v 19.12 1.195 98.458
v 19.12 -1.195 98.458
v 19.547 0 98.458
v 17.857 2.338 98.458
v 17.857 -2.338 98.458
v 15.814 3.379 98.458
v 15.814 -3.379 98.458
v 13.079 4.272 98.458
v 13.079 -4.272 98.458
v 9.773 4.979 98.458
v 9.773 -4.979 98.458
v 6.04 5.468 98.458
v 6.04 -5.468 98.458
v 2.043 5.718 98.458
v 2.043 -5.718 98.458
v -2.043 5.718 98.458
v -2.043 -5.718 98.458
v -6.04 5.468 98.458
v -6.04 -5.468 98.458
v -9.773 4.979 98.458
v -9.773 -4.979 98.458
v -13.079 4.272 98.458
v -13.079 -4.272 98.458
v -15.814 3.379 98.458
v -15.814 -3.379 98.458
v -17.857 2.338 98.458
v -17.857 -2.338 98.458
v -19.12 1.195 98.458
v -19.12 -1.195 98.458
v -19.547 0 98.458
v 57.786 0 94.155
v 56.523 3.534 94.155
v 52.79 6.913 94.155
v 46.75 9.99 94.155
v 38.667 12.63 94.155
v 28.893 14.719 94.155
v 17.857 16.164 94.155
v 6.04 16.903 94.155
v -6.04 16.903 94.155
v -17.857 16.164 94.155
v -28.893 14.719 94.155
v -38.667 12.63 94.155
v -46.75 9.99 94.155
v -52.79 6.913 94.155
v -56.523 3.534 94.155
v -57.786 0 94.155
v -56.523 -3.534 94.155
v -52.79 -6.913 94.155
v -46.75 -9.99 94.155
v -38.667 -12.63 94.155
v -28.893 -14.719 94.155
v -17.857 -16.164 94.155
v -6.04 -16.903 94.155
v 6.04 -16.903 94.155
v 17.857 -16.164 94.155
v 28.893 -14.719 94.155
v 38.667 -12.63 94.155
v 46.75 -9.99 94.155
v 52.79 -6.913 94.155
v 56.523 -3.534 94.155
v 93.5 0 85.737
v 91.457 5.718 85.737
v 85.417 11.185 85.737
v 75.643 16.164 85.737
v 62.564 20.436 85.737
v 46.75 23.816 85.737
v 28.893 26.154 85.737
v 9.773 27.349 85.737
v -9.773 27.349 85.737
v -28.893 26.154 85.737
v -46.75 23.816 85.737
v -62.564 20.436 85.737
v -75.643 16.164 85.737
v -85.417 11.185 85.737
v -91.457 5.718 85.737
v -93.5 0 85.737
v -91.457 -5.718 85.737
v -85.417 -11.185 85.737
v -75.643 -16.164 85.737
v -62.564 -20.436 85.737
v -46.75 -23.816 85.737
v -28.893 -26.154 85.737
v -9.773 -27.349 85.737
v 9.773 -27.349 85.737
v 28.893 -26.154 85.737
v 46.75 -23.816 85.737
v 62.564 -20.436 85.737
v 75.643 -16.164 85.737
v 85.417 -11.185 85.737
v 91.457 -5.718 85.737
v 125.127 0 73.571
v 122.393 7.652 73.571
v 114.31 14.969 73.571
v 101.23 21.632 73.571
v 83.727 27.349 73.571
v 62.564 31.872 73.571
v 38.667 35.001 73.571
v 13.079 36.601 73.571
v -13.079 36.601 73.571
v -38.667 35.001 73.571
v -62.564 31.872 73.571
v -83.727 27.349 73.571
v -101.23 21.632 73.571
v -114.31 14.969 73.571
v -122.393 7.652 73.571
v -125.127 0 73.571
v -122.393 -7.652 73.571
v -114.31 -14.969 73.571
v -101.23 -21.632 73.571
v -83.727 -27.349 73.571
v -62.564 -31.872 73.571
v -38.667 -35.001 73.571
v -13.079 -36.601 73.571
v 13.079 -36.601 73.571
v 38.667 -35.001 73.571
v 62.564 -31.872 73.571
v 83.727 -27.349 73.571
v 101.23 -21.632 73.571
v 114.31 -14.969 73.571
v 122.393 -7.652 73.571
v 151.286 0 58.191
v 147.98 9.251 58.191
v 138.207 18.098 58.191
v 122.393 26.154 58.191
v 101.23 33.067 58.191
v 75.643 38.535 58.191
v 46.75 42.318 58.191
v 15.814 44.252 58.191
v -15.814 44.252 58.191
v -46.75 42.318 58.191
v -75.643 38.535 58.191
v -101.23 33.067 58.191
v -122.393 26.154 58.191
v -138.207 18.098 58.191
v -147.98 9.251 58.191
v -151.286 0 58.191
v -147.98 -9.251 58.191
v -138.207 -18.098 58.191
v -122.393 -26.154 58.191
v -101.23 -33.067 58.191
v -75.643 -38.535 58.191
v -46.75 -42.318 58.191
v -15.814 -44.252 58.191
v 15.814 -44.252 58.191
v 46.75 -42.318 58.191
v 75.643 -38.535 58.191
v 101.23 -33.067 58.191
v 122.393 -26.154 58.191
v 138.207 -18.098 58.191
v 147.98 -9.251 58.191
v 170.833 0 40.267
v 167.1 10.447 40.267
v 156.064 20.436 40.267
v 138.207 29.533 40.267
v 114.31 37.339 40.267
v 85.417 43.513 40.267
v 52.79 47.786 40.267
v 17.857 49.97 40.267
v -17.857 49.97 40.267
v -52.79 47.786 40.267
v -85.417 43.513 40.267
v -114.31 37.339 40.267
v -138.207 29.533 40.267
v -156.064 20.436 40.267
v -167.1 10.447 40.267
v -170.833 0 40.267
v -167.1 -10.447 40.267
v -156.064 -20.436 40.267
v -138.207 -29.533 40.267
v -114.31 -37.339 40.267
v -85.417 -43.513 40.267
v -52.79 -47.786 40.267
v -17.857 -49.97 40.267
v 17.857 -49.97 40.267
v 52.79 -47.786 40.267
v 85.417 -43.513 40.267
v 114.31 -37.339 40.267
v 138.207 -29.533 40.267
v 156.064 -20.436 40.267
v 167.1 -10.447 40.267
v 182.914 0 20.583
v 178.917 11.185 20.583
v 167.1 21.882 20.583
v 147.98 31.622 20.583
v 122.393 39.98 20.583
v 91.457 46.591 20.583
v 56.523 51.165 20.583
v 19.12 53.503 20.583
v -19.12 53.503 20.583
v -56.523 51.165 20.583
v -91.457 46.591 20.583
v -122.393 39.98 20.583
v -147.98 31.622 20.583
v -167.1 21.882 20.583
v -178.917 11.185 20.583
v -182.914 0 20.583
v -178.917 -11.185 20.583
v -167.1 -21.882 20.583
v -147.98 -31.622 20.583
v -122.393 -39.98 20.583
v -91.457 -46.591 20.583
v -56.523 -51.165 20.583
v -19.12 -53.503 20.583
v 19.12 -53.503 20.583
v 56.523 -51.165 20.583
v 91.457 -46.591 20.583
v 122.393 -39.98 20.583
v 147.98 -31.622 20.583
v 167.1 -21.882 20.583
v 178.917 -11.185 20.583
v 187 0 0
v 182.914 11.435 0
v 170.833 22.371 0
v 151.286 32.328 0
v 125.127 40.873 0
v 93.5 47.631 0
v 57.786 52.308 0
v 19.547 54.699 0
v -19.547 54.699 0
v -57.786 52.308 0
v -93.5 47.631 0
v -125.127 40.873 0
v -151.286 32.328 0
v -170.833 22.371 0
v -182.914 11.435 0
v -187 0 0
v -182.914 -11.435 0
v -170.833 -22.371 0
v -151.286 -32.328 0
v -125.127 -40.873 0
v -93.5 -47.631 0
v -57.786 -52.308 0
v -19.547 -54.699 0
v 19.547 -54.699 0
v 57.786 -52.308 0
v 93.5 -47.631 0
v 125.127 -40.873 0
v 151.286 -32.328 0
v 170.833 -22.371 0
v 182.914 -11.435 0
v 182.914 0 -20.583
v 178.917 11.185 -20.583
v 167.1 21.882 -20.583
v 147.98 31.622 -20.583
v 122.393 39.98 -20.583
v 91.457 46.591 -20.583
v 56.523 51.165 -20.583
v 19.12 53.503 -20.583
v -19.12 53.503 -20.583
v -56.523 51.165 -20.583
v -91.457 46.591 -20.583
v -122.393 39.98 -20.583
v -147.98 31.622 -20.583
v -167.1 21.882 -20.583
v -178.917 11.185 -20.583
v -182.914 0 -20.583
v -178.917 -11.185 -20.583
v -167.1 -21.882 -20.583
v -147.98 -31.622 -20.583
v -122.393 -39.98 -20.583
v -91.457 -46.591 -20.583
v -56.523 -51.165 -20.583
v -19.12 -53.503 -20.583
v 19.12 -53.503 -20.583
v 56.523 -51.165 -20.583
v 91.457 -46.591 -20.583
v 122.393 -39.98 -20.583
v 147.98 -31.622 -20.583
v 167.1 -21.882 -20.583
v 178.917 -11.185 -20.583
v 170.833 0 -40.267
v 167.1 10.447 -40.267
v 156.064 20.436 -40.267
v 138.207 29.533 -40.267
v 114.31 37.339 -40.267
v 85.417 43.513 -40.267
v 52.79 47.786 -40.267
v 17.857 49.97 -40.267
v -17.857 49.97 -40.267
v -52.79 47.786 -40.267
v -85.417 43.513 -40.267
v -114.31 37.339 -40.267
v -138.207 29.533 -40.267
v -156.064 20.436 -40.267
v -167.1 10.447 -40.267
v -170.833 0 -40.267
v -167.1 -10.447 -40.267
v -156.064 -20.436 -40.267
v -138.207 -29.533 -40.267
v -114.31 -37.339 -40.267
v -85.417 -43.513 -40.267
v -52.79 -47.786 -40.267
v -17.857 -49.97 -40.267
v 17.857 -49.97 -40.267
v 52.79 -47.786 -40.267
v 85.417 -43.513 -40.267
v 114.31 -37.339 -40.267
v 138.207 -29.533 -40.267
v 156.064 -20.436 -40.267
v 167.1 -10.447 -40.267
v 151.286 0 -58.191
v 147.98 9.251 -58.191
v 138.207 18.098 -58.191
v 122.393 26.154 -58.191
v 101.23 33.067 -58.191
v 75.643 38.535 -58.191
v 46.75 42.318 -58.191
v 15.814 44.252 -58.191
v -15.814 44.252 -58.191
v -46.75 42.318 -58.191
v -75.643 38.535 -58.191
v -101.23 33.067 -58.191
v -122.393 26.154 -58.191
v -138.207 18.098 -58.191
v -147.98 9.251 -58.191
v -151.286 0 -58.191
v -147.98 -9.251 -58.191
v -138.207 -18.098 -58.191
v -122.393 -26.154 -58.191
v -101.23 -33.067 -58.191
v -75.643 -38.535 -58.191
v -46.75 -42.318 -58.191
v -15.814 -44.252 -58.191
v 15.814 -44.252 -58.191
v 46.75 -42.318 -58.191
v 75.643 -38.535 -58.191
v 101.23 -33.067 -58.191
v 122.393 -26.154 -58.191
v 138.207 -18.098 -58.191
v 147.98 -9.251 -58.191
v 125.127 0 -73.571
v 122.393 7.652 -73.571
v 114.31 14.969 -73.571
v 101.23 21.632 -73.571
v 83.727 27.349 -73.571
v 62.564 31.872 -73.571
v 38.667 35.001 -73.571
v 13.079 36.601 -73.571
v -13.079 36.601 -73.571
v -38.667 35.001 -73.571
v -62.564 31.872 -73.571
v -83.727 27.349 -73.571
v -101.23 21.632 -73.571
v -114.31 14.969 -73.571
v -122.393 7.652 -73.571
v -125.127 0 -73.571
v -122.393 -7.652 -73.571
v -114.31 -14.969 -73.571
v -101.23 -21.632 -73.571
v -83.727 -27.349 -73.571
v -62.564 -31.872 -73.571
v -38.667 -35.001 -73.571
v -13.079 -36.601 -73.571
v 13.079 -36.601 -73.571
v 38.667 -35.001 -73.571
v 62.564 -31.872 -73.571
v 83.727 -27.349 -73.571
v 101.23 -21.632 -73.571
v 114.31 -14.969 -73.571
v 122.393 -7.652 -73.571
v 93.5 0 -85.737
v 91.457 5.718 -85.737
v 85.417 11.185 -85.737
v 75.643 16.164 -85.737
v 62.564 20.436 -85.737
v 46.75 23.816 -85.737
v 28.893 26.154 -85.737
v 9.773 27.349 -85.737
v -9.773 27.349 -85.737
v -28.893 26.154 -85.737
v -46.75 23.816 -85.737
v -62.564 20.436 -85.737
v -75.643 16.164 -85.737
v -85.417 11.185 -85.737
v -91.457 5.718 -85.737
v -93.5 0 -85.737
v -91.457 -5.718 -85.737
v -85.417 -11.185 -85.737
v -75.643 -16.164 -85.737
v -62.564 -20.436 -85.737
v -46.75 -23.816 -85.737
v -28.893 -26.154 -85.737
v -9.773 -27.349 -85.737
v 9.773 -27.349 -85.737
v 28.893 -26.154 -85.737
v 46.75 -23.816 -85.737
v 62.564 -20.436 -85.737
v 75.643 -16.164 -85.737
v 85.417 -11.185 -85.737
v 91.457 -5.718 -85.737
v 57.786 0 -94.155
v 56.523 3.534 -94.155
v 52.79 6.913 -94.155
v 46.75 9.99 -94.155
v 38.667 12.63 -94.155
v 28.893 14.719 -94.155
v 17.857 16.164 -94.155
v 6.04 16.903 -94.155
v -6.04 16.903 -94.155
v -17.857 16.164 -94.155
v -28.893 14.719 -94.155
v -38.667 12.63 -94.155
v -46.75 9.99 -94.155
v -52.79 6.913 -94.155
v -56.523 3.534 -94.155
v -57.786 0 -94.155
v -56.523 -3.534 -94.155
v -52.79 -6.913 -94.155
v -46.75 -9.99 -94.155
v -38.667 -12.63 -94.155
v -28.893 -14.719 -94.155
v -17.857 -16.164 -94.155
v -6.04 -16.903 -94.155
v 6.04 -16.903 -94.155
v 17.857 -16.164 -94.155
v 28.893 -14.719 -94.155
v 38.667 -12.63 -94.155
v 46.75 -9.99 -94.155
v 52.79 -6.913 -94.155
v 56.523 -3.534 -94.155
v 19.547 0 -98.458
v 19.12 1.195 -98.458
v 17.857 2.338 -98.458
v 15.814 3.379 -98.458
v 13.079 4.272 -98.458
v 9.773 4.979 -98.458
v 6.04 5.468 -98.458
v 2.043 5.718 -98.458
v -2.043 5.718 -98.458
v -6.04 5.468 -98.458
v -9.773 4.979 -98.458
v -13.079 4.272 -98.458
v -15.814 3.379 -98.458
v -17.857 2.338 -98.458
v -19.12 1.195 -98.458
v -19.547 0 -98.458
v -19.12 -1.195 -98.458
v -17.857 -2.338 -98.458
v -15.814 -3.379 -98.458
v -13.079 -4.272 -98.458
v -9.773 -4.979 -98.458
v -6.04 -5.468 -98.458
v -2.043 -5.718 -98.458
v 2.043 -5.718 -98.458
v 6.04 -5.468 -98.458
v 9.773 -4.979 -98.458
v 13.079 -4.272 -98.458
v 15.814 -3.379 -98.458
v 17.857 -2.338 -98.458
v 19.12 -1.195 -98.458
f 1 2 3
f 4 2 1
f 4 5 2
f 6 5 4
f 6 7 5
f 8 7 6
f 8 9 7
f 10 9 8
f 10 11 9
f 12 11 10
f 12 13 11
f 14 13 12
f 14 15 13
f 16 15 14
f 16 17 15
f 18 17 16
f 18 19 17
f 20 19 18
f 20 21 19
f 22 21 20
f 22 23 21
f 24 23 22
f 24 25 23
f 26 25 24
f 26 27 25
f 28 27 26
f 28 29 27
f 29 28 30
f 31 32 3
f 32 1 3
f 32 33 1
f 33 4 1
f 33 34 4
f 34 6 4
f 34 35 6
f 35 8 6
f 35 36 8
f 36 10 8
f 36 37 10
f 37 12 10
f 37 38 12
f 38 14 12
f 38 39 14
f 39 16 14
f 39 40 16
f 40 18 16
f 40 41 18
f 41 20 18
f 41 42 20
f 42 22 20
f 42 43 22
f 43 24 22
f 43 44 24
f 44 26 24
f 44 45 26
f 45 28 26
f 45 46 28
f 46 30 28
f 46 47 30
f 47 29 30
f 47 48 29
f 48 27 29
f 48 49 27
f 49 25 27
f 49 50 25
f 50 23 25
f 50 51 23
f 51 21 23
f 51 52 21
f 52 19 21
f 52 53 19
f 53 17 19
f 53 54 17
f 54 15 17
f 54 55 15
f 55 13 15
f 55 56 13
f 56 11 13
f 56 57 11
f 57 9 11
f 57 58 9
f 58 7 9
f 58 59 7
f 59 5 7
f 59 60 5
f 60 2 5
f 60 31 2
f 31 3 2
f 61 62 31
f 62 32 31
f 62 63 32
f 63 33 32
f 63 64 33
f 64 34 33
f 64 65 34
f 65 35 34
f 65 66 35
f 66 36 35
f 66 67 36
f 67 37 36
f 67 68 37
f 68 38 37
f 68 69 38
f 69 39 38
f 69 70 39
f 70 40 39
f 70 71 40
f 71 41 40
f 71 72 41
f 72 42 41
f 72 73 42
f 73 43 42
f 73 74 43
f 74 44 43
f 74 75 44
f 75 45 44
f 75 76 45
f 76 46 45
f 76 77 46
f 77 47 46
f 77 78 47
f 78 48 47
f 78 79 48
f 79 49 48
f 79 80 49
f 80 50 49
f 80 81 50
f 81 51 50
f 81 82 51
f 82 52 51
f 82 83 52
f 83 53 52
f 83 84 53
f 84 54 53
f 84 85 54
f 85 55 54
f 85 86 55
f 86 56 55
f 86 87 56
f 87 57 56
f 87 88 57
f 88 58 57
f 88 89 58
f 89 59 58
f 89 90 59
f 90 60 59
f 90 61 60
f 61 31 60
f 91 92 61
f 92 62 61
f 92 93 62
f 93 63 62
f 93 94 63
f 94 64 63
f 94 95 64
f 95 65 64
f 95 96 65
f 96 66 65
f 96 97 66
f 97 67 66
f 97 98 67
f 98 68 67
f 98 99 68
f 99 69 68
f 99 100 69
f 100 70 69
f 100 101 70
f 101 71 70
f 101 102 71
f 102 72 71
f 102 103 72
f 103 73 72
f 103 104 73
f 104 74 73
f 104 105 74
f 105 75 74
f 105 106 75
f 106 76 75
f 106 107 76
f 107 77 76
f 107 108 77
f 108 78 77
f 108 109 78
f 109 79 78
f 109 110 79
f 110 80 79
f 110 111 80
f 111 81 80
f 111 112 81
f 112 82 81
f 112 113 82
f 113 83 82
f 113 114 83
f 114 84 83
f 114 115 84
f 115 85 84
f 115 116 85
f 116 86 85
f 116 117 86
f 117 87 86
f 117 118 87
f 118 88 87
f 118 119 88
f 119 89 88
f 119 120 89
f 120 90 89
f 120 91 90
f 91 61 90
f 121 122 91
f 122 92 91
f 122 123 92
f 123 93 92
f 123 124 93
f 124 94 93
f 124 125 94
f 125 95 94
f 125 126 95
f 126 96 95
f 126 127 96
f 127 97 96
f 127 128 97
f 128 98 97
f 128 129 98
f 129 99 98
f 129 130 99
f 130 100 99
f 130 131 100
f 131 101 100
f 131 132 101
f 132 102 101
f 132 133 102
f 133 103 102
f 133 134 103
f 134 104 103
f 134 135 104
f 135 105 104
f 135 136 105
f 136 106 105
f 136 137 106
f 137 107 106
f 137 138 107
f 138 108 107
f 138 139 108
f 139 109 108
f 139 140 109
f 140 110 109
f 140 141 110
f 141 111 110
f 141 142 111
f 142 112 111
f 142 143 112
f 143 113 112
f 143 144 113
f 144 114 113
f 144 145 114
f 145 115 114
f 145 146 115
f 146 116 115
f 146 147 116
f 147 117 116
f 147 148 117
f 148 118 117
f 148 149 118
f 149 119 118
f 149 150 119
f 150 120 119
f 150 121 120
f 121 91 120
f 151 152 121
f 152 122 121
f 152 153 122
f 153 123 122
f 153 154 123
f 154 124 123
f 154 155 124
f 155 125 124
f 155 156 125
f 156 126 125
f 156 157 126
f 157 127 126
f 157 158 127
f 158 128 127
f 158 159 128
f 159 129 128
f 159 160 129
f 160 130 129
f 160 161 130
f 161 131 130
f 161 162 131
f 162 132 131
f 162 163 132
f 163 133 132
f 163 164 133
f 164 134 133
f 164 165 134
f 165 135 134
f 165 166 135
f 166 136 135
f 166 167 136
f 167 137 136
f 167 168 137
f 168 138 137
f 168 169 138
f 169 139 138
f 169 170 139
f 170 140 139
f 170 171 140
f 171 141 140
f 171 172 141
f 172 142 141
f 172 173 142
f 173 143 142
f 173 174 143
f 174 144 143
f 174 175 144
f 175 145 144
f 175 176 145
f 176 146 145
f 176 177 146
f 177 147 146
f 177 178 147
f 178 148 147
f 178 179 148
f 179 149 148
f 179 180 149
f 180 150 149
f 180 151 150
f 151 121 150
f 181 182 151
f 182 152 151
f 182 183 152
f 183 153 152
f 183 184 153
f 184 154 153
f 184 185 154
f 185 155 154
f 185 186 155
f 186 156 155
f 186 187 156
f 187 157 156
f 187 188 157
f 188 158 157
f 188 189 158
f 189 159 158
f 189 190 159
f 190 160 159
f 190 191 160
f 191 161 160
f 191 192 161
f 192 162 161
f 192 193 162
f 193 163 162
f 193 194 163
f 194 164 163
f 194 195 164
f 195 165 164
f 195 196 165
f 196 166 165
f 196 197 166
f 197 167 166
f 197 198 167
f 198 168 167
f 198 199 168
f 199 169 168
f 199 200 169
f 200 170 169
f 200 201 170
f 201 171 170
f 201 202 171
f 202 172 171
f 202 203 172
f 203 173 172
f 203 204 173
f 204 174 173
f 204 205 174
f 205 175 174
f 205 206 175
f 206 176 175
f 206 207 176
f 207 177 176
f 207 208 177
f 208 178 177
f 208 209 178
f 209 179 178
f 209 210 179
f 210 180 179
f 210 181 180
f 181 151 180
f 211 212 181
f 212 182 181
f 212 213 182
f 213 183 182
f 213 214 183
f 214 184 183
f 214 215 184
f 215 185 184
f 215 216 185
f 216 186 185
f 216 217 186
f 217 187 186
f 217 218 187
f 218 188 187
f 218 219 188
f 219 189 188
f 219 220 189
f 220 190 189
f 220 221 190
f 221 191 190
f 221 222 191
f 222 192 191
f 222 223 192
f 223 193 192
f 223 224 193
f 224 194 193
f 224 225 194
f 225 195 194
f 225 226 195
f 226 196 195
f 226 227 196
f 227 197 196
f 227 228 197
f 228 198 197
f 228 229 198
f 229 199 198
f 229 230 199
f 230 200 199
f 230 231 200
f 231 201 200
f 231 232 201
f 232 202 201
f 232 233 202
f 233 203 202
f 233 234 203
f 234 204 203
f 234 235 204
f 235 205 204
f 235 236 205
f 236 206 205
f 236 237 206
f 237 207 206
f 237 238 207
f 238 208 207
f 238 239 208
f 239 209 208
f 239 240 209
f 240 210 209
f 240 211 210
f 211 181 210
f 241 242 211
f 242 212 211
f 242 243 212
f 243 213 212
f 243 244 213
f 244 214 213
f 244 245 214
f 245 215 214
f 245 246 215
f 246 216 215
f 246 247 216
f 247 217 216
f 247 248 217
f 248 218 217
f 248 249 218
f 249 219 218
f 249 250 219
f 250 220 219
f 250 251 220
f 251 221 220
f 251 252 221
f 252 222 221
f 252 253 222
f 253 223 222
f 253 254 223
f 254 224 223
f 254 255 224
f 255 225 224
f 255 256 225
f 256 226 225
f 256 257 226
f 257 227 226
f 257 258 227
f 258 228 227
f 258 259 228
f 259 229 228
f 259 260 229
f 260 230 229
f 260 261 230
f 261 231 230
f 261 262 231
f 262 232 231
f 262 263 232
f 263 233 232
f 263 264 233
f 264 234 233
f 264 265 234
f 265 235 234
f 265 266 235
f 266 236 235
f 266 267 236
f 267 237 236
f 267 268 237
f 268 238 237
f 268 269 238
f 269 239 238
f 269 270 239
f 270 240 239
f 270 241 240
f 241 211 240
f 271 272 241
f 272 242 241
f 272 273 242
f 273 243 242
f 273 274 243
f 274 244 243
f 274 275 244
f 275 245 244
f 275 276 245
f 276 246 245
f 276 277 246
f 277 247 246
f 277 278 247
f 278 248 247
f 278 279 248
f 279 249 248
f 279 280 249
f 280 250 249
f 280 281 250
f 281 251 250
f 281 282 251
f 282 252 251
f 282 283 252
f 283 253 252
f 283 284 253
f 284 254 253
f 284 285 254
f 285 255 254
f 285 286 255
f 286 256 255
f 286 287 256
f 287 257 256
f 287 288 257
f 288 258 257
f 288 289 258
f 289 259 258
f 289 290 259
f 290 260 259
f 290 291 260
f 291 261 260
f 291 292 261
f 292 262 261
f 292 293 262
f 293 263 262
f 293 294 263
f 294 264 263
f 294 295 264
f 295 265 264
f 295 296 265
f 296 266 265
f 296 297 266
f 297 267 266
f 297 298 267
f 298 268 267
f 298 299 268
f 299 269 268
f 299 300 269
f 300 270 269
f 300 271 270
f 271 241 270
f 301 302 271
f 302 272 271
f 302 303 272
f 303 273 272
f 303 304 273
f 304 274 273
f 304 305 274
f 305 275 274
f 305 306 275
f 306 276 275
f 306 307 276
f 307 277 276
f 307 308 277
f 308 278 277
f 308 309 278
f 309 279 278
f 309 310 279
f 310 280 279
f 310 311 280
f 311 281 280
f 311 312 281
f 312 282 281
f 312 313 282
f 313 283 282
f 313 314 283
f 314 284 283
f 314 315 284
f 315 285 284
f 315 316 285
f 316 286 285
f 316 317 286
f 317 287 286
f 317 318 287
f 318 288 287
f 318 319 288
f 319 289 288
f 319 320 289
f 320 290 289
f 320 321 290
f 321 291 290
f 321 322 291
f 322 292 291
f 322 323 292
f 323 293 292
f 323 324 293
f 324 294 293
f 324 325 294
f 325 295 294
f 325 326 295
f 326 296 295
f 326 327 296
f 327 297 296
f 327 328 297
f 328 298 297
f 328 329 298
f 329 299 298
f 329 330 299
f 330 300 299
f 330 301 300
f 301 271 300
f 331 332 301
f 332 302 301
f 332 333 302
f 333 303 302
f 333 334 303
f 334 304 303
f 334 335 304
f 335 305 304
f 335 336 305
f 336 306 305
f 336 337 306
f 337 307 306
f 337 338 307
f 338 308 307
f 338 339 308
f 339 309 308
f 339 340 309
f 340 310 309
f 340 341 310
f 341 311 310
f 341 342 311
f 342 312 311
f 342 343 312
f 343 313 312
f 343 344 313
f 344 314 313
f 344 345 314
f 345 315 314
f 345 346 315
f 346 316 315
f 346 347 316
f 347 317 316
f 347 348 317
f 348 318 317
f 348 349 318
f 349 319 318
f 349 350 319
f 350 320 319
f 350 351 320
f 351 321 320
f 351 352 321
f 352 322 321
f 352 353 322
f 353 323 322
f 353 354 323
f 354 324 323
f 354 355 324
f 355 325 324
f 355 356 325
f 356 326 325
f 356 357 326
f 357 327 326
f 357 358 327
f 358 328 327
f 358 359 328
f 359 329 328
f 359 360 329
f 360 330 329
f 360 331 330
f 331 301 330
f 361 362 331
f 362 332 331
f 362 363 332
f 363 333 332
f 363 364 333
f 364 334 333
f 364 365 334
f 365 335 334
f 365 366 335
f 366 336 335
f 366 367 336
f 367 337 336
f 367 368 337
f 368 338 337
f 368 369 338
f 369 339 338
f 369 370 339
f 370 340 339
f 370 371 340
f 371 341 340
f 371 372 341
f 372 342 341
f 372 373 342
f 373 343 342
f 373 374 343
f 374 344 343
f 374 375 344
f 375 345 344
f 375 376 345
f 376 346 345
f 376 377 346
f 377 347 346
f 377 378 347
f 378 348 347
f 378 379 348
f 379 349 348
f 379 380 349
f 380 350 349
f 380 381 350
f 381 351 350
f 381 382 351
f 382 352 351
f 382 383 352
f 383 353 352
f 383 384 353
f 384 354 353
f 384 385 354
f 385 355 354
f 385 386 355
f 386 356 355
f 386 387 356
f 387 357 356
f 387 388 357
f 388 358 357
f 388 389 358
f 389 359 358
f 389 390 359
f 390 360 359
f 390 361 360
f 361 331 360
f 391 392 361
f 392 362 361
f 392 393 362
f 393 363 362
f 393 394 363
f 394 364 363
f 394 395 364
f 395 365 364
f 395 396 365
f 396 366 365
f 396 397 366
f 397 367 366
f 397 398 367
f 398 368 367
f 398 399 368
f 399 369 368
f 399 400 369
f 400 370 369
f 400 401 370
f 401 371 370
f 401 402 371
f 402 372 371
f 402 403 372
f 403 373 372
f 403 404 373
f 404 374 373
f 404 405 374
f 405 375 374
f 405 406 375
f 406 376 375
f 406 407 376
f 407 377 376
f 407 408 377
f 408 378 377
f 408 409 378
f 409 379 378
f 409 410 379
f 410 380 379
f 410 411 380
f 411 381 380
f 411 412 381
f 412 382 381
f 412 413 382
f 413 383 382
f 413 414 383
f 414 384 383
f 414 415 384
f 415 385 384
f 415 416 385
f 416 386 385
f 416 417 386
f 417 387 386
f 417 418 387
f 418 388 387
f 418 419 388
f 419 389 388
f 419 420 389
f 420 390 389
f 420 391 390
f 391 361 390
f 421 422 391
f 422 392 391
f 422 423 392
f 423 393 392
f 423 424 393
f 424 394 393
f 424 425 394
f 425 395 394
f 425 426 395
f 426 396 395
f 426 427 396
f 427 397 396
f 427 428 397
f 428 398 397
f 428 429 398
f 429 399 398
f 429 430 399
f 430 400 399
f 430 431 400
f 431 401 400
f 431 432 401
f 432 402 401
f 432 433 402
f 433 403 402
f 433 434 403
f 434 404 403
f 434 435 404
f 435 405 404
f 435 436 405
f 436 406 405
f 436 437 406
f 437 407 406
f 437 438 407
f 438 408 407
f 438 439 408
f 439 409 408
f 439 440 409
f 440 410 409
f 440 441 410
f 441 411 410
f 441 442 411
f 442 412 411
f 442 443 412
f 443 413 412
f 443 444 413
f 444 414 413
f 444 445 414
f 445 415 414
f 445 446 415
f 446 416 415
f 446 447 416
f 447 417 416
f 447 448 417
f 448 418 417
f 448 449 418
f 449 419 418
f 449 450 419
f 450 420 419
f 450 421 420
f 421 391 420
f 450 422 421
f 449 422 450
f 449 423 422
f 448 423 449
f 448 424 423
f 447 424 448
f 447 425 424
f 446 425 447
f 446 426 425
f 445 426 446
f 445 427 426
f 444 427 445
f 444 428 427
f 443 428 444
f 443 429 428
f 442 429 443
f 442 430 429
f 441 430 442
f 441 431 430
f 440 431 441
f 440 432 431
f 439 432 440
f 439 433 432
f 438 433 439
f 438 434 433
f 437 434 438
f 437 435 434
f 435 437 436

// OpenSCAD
// Generated by SolidPython 1.0.1 on 2020-07-29 00:46:52


scale(v = [17, 5, 9]) {
	sphere(r = 11);
}
/***********************************************
*********      SolidPython code:      **********
************************************************
 
# import packages: SolidPython
from solid import *
from solid.utils import *
from itertools import chain, combinations, permutations


class Resize:

    def __init__(self, scad_file):
        self.scad_file = scad_file
        #self.scad_file = import_scad(scad_file)
        # cone/cylinder param:
        self.r1 = 0
        self.r2 = 0
        self.h = 0
        # rectangular prism param:
        self.w = 0
        self.l = 0
        # ellipse param:
        self.r = 0

    # import OpenScad code (file name corresponds to shape)


    # classify shape + parameters
    def assign(self, param1, param2, param3):
        if self.scad_file == 'cone.scad':
            self.r1 = param1
            self.r2 = param2
            self.h = param3
        elif self.scad_file == 'cylinder.scad':
            self.r1 = param1
            self.r2 = param2
            self.h = param3
        elif self.scad_file == 'rectangularPrism.scad':
            self.h = param1
            self.l = param2
            self.w = param3
        else:
            self.r = param1
            self.h = param2

    # resize parameters
    def iterate(self):
        x = range(3, 20, 2)
        i = 1
        if self.scad_file == 'cone.scad':
            tempList = list(permutations(x, 2))
            for temp in tempList:
                param1 = temp[0]
                param2 = temp[1]
                filepath = 'produced_scad_files/' + 'cone' + str(param1) + '_' + str(param2) + '_' + '.scad'
                scad_render_to_file(cylinder(h=param1, r1=param2, r2=0), filepath)

        elif self.scad_file == 'cylinder.scad':
            tempList = list(permutations(x, 3))
            for temp in tempList:
                param1 = temp[0]
                param2 = temp[1]
                filepath = 'produced_scad_files/' + 'cylinder' + str(param1) + '_' + str(param2) + '_' + '.scad'
                scad_render_to_file(cylinder(h=param1, r1=param2, r2=param2), filepath)

        elif self.scad_file == 'rectangularPrism.scad':
            tempList = list(permutations(x, 3))
            for temp in tempList:
                param1 = temp[0]
                param2 = temp[1]
                param3 = temp[2]
                filepath = 'produced_scad_files/' + 'rectangularPrism' + str(param1) + '_' + str(param2) + '_' + str(
                    param3) + '.scad'
                scad_render_to_file(cube(size=(param1, param2, param3)), filepath)

        elif self.scad_file == 'ellipse.scad':
            tempList = list(permutations(x, 4))
            for temp in tempList:
                param1 = temp[0]
                param2 = temp[1]
                param3 = temp[2]
                param4 = temp[3]
                filepath = 'produced_scad_files/' + 'ellipse' + str(param1) + '_' + str(param2) + '_' + str(param3) + '_' + str(param4) + '.scad'
                scad_render_to_file(scale([param1, param2, param3])(sphere(r=param4)), filepath)

    def render_to_scadfile(self):
        scad_render_to_file(scad, 'example.scad') 
 
************************************************/
